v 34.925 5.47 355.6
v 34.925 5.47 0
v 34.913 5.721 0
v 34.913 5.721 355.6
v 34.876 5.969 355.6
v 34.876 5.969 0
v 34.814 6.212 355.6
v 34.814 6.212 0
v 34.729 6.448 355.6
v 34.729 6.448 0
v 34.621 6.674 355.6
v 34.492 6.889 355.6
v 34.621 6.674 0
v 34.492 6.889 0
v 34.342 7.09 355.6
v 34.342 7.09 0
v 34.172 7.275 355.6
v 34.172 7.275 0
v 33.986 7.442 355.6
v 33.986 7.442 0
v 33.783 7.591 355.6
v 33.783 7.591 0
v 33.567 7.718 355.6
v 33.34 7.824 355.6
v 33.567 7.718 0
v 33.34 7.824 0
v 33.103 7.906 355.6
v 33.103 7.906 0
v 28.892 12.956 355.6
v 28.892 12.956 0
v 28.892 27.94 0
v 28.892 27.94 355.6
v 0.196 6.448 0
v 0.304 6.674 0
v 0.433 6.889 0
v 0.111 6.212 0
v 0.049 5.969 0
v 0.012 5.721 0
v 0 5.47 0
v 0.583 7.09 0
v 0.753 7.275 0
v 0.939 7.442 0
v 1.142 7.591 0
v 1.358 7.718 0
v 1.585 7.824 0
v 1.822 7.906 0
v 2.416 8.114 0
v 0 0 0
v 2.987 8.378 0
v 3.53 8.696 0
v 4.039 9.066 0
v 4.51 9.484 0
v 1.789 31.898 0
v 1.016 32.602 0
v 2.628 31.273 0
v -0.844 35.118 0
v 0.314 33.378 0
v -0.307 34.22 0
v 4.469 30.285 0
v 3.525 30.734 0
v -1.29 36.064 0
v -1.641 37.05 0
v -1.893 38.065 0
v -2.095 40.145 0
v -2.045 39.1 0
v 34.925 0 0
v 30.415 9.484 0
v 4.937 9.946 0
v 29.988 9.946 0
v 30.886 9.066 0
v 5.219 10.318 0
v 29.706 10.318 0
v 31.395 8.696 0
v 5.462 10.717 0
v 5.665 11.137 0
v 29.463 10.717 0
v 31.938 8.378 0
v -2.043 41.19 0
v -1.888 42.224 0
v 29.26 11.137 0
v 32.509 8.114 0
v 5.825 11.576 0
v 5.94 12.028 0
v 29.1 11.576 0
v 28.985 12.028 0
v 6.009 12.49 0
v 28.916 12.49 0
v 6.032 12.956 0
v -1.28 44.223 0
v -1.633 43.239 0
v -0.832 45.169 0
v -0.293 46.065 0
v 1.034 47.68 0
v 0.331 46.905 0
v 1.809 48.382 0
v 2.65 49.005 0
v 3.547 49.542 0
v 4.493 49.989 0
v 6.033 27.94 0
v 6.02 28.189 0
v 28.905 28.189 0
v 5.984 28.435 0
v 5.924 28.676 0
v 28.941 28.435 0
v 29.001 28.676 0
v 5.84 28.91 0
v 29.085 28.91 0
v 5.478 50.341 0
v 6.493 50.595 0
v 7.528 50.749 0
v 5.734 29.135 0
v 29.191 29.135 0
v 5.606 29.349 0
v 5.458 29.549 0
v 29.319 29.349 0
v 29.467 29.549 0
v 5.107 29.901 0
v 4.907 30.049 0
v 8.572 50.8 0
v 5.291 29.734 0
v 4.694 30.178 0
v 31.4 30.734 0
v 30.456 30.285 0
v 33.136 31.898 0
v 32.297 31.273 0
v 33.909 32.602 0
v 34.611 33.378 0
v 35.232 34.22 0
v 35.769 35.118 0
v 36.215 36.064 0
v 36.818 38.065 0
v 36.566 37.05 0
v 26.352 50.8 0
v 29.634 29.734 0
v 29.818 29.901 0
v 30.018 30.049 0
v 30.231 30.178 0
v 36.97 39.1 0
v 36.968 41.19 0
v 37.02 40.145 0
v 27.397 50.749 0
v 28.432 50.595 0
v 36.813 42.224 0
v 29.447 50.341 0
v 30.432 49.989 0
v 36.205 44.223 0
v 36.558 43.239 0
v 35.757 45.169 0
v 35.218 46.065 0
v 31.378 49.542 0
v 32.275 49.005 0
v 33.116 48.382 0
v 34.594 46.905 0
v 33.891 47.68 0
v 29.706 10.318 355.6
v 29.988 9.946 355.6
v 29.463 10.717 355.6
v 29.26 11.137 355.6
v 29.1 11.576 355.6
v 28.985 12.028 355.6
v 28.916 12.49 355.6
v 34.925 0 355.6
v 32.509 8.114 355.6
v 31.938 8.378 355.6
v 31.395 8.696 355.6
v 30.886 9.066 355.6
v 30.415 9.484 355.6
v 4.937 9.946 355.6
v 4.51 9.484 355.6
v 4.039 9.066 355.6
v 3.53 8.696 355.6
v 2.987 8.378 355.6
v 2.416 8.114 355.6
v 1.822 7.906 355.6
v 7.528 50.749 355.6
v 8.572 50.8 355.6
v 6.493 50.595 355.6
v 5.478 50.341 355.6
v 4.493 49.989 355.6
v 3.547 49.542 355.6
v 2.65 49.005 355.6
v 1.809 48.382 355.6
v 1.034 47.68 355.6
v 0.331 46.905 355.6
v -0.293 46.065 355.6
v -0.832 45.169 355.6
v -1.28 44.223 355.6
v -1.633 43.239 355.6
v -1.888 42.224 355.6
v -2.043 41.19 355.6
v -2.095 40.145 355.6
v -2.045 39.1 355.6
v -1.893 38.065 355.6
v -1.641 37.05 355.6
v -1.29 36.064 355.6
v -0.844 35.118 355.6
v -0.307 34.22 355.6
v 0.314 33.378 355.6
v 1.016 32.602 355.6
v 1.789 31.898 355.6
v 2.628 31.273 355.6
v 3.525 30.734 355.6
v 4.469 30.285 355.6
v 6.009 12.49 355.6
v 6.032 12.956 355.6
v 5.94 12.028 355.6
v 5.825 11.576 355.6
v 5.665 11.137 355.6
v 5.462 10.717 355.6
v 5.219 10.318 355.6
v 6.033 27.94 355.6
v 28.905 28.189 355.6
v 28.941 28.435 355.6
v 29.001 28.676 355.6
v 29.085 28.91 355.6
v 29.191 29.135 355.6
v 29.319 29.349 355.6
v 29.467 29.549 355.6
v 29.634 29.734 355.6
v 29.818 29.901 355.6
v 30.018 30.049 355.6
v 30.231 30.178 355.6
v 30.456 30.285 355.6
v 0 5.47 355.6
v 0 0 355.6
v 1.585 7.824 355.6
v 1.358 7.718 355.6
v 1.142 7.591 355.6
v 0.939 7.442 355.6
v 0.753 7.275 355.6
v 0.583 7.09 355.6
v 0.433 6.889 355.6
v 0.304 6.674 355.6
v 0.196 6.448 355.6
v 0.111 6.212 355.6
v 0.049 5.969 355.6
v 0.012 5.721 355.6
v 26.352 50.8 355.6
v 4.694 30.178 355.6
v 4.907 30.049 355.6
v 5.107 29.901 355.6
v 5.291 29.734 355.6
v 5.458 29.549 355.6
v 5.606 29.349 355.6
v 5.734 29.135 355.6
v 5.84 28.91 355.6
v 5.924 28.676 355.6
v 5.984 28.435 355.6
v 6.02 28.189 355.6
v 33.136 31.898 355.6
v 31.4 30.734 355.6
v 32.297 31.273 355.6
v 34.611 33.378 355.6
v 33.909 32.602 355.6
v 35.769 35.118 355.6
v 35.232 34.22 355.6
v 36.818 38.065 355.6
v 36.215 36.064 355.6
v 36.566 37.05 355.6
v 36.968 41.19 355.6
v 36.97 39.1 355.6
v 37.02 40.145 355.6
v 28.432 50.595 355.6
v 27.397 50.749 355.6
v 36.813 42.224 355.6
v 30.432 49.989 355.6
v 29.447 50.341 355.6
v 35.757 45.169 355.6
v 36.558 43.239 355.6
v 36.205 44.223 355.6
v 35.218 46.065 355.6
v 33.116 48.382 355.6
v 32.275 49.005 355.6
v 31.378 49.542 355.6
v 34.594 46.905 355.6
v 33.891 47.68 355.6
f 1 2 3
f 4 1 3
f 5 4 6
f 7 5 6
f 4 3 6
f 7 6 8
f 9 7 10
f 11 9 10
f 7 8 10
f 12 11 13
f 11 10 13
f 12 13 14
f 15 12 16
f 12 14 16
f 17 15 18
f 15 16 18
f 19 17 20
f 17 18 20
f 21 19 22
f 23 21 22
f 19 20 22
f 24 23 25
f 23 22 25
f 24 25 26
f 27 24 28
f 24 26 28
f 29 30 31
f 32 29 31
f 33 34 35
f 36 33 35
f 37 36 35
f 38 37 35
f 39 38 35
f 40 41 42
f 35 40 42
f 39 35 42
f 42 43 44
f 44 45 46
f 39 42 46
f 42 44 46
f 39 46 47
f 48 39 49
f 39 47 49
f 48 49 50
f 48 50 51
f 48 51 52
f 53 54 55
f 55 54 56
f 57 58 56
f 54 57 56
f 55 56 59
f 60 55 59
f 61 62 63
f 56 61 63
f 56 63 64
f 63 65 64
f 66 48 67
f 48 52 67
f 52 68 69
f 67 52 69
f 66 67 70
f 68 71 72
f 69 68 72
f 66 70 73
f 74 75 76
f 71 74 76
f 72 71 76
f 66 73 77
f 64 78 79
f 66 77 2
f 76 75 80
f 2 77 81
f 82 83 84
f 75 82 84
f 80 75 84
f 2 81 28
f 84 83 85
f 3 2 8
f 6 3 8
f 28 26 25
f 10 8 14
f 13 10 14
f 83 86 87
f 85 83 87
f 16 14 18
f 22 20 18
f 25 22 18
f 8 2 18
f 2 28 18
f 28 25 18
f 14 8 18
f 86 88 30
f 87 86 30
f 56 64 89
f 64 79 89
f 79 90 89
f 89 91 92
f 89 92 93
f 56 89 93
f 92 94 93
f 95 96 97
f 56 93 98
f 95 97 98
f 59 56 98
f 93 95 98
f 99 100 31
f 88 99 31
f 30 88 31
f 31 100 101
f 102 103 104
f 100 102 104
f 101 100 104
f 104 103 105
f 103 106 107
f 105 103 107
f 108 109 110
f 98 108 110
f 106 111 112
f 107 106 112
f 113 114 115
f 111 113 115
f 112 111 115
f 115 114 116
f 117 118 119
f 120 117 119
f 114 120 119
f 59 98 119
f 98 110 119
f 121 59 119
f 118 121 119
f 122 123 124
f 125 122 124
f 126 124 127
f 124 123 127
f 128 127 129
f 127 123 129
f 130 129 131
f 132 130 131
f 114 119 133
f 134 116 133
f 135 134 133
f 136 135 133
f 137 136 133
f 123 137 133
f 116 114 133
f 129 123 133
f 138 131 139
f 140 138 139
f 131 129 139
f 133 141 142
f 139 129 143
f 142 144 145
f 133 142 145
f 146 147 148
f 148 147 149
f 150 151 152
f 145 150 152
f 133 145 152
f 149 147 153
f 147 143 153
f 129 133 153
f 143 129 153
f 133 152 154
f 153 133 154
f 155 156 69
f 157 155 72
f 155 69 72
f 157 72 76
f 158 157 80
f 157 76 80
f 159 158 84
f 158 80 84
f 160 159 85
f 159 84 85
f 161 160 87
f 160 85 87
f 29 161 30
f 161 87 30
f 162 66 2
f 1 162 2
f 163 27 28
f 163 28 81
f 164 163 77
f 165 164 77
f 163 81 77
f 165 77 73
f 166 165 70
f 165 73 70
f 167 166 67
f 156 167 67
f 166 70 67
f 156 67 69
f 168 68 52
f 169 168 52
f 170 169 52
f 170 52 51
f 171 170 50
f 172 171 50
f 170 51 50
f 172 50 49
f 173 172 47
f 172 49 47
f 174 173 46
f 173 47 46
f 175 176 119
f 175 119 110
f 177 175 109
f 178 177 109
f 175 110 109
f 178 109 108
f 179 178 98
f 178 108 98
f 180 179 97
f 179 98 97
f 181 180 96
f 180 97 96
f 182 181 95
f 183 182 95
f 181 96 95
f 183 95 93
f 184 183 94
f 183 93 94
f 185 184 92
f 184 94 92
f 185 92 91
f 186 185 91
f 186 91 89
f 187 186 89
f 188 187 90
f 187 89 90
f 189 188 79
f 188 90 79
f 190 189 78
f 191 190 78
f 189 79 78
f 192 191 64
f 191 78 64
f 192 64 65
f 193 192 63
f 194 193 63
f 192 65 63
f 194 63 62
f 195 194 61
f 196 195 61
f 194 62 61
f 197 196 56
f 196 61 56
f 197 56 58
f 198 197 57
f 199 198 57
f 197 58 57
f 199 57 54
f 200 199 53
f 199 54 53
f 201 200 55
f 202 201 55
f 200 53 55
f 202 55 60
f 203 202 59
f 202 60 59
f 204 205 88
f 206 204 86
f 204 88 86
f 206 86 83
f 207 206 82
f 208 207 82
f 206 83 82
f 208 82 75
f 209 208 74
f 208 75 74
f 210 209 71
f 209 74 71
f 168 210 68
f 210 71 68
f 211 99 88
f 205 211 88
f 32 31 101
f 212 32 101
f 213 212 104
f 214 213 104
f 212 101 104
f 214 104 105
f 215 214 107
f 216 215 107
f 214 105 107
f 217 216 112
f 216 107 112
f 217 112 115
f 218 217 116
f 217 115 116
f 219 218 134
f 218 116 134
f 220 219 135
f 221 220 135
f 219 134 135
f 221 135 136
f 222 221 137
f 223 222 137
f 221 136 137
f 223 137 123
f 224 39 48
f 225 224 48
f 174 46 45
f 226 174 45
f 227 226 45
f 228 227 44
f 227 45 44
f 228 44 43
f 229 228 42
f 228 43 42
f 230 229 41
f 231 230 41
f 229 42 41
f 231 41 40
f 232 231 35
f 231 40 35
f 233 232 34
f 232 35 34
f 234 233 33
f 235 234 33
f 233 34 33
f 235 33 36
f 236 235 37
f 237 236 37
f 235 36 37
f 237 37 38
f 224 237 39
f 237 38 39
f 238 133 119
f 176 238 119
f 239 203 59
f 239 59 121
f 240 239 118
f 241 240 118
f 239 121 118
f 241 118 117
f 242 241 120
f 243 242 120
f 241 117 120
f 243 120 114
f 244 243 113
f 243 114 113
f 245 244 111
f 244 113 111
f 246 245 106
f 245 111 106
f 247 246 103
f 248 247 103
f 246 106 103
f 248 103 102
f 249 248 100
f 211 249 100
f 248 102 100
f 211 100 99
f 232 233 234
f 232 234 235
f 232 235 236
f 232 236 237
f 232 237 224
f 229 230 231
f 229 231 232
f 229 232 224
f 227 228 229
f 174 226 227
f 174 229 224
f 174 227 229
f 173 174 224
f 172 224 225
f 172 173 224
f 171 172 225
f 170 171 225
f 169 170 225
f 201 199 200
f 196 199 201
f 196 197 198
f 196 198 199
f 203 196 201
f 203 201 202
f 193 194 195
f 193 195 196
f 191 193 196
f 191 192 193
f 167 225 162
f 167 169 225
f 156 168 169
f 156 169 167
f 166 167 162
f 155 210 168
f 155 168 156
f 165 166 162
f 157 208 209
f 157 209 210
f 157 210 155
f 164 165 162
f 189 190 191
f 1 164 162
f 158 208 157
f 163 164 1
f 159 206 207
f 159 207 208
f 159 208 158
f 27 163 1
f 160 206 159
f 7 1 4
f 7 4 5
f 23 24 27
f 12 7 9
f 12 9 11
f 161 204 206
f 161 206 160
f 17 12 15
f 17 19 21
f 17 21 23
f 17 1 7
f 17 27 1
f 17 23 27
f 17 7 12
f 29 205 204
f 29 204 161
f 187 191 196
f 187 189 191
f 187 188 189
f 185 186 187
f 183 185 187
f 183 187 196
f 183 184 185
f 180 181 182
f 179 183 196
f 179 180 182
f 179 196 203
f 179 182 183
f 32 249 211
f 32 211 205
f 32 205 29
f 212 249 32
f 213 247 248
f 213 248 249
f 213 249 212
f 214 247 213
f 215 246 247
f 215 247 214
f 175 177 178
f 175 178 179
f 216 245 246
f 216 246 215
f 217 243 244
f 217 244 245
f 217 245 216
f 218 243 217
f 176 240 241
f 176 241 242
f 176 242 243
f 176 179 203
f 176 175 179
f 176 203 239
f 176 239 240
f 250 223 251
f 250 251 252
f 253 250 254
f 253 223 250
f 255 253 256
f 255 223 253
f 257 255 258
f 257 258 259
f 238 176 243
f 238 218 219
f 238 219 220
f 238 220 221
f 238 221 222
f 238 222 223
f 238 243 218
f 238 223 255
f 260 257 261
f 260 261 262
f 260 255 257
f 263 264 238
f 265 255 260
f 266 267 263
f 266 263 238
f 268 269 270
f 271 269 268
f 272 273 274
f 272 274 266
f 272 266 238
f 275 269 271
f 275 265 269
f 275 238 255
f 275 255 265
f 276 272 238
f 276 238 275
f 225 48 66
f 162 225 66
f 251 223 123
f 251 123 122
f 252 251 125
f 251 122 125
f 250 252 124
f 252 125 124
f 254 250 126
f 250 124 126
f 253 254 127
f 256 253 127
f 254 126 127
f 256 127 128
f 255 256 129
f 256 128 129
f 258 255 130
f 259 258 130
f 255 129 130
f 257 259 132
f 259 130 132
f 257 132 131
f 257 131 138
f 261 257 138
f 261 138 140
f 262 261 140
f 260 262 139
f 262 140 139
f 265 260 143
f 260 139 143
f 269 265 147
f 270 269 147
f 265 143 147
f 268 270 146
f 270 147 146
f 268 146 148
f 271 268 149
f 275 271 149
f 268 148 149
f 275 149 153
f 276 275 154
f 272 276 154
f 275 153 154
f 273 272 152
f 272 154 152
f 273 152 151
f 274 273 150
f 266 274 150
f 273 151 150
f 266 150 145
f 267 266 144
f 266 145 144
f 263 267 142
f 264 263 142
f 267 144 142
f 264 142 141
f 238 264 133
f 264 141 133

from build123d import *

# Parameters (mm, degrees)
BASE_EXTRUDE_DEPTH = 355.6


with BuildPart() as part:
    # Sketch1 → Base-Extrude (new body)
    with BuildSketch(Plane.XY):
        with BuildLine():
            Line((0, 0), (34.925, 0))
            Line((34.925, 0), (34.925, 5.470090329))
            ThreePointArc((34.925, 5.470090329), (34.41915145, 6.991217504), (33.103088283, 7.906470681))
            ThreePointArc((33.103088283, 7.906470681), (31.394911277, 8.696422297), (29.987795308, 9.946189033))
            ThreePointArc((29.987795308, 9.946189033), (29.174834337, 11.354573038), (28.8925, 12.956053095))
            Line((28.8925, 12.956053095), (28.8925, 27.94))
            ThreePointArc((28.8925, 27.94), (29.319092252, 29.348938498), (30.455576923, 30.284615385))
            ThreePointArc((30.455576923, 30.284615385), (36.813334648, 42.22416693), (26.3525, 50.8))
            Line((26.3525, 50.8), (8.5725, 50.8))
            ThreePointArc((8.5725, 50.8), (-1.888334648, 42.22416693), (4.469423077, 30.284615385))
            ThreePointArc((4.469423077, 30.284615385), (5.605907748, 29.348938498), (6.0325, 27.94))
            Line((6.0325, 27.94), (6.0325, 12.956053095))
            ThreePointArc((6.0325, 12.956053095), (5.750165663, 11.354573038), (4.937204692, 9.946189033))
            ThreePointArc((4.937204692, 9.946189033), (3.530088723, 8.696422297), (1.821911717, 7.906470681))
            ThreePointArc((1.821911717, 7.906470681), (0.50584855, 6.991217504), (0, 5.470090329))
            Line((0, 5.470090329), (0, 0))
        make_face()
    extrude(amount=BASE_EXTRUDE_DEPTH)


solid = part.part
